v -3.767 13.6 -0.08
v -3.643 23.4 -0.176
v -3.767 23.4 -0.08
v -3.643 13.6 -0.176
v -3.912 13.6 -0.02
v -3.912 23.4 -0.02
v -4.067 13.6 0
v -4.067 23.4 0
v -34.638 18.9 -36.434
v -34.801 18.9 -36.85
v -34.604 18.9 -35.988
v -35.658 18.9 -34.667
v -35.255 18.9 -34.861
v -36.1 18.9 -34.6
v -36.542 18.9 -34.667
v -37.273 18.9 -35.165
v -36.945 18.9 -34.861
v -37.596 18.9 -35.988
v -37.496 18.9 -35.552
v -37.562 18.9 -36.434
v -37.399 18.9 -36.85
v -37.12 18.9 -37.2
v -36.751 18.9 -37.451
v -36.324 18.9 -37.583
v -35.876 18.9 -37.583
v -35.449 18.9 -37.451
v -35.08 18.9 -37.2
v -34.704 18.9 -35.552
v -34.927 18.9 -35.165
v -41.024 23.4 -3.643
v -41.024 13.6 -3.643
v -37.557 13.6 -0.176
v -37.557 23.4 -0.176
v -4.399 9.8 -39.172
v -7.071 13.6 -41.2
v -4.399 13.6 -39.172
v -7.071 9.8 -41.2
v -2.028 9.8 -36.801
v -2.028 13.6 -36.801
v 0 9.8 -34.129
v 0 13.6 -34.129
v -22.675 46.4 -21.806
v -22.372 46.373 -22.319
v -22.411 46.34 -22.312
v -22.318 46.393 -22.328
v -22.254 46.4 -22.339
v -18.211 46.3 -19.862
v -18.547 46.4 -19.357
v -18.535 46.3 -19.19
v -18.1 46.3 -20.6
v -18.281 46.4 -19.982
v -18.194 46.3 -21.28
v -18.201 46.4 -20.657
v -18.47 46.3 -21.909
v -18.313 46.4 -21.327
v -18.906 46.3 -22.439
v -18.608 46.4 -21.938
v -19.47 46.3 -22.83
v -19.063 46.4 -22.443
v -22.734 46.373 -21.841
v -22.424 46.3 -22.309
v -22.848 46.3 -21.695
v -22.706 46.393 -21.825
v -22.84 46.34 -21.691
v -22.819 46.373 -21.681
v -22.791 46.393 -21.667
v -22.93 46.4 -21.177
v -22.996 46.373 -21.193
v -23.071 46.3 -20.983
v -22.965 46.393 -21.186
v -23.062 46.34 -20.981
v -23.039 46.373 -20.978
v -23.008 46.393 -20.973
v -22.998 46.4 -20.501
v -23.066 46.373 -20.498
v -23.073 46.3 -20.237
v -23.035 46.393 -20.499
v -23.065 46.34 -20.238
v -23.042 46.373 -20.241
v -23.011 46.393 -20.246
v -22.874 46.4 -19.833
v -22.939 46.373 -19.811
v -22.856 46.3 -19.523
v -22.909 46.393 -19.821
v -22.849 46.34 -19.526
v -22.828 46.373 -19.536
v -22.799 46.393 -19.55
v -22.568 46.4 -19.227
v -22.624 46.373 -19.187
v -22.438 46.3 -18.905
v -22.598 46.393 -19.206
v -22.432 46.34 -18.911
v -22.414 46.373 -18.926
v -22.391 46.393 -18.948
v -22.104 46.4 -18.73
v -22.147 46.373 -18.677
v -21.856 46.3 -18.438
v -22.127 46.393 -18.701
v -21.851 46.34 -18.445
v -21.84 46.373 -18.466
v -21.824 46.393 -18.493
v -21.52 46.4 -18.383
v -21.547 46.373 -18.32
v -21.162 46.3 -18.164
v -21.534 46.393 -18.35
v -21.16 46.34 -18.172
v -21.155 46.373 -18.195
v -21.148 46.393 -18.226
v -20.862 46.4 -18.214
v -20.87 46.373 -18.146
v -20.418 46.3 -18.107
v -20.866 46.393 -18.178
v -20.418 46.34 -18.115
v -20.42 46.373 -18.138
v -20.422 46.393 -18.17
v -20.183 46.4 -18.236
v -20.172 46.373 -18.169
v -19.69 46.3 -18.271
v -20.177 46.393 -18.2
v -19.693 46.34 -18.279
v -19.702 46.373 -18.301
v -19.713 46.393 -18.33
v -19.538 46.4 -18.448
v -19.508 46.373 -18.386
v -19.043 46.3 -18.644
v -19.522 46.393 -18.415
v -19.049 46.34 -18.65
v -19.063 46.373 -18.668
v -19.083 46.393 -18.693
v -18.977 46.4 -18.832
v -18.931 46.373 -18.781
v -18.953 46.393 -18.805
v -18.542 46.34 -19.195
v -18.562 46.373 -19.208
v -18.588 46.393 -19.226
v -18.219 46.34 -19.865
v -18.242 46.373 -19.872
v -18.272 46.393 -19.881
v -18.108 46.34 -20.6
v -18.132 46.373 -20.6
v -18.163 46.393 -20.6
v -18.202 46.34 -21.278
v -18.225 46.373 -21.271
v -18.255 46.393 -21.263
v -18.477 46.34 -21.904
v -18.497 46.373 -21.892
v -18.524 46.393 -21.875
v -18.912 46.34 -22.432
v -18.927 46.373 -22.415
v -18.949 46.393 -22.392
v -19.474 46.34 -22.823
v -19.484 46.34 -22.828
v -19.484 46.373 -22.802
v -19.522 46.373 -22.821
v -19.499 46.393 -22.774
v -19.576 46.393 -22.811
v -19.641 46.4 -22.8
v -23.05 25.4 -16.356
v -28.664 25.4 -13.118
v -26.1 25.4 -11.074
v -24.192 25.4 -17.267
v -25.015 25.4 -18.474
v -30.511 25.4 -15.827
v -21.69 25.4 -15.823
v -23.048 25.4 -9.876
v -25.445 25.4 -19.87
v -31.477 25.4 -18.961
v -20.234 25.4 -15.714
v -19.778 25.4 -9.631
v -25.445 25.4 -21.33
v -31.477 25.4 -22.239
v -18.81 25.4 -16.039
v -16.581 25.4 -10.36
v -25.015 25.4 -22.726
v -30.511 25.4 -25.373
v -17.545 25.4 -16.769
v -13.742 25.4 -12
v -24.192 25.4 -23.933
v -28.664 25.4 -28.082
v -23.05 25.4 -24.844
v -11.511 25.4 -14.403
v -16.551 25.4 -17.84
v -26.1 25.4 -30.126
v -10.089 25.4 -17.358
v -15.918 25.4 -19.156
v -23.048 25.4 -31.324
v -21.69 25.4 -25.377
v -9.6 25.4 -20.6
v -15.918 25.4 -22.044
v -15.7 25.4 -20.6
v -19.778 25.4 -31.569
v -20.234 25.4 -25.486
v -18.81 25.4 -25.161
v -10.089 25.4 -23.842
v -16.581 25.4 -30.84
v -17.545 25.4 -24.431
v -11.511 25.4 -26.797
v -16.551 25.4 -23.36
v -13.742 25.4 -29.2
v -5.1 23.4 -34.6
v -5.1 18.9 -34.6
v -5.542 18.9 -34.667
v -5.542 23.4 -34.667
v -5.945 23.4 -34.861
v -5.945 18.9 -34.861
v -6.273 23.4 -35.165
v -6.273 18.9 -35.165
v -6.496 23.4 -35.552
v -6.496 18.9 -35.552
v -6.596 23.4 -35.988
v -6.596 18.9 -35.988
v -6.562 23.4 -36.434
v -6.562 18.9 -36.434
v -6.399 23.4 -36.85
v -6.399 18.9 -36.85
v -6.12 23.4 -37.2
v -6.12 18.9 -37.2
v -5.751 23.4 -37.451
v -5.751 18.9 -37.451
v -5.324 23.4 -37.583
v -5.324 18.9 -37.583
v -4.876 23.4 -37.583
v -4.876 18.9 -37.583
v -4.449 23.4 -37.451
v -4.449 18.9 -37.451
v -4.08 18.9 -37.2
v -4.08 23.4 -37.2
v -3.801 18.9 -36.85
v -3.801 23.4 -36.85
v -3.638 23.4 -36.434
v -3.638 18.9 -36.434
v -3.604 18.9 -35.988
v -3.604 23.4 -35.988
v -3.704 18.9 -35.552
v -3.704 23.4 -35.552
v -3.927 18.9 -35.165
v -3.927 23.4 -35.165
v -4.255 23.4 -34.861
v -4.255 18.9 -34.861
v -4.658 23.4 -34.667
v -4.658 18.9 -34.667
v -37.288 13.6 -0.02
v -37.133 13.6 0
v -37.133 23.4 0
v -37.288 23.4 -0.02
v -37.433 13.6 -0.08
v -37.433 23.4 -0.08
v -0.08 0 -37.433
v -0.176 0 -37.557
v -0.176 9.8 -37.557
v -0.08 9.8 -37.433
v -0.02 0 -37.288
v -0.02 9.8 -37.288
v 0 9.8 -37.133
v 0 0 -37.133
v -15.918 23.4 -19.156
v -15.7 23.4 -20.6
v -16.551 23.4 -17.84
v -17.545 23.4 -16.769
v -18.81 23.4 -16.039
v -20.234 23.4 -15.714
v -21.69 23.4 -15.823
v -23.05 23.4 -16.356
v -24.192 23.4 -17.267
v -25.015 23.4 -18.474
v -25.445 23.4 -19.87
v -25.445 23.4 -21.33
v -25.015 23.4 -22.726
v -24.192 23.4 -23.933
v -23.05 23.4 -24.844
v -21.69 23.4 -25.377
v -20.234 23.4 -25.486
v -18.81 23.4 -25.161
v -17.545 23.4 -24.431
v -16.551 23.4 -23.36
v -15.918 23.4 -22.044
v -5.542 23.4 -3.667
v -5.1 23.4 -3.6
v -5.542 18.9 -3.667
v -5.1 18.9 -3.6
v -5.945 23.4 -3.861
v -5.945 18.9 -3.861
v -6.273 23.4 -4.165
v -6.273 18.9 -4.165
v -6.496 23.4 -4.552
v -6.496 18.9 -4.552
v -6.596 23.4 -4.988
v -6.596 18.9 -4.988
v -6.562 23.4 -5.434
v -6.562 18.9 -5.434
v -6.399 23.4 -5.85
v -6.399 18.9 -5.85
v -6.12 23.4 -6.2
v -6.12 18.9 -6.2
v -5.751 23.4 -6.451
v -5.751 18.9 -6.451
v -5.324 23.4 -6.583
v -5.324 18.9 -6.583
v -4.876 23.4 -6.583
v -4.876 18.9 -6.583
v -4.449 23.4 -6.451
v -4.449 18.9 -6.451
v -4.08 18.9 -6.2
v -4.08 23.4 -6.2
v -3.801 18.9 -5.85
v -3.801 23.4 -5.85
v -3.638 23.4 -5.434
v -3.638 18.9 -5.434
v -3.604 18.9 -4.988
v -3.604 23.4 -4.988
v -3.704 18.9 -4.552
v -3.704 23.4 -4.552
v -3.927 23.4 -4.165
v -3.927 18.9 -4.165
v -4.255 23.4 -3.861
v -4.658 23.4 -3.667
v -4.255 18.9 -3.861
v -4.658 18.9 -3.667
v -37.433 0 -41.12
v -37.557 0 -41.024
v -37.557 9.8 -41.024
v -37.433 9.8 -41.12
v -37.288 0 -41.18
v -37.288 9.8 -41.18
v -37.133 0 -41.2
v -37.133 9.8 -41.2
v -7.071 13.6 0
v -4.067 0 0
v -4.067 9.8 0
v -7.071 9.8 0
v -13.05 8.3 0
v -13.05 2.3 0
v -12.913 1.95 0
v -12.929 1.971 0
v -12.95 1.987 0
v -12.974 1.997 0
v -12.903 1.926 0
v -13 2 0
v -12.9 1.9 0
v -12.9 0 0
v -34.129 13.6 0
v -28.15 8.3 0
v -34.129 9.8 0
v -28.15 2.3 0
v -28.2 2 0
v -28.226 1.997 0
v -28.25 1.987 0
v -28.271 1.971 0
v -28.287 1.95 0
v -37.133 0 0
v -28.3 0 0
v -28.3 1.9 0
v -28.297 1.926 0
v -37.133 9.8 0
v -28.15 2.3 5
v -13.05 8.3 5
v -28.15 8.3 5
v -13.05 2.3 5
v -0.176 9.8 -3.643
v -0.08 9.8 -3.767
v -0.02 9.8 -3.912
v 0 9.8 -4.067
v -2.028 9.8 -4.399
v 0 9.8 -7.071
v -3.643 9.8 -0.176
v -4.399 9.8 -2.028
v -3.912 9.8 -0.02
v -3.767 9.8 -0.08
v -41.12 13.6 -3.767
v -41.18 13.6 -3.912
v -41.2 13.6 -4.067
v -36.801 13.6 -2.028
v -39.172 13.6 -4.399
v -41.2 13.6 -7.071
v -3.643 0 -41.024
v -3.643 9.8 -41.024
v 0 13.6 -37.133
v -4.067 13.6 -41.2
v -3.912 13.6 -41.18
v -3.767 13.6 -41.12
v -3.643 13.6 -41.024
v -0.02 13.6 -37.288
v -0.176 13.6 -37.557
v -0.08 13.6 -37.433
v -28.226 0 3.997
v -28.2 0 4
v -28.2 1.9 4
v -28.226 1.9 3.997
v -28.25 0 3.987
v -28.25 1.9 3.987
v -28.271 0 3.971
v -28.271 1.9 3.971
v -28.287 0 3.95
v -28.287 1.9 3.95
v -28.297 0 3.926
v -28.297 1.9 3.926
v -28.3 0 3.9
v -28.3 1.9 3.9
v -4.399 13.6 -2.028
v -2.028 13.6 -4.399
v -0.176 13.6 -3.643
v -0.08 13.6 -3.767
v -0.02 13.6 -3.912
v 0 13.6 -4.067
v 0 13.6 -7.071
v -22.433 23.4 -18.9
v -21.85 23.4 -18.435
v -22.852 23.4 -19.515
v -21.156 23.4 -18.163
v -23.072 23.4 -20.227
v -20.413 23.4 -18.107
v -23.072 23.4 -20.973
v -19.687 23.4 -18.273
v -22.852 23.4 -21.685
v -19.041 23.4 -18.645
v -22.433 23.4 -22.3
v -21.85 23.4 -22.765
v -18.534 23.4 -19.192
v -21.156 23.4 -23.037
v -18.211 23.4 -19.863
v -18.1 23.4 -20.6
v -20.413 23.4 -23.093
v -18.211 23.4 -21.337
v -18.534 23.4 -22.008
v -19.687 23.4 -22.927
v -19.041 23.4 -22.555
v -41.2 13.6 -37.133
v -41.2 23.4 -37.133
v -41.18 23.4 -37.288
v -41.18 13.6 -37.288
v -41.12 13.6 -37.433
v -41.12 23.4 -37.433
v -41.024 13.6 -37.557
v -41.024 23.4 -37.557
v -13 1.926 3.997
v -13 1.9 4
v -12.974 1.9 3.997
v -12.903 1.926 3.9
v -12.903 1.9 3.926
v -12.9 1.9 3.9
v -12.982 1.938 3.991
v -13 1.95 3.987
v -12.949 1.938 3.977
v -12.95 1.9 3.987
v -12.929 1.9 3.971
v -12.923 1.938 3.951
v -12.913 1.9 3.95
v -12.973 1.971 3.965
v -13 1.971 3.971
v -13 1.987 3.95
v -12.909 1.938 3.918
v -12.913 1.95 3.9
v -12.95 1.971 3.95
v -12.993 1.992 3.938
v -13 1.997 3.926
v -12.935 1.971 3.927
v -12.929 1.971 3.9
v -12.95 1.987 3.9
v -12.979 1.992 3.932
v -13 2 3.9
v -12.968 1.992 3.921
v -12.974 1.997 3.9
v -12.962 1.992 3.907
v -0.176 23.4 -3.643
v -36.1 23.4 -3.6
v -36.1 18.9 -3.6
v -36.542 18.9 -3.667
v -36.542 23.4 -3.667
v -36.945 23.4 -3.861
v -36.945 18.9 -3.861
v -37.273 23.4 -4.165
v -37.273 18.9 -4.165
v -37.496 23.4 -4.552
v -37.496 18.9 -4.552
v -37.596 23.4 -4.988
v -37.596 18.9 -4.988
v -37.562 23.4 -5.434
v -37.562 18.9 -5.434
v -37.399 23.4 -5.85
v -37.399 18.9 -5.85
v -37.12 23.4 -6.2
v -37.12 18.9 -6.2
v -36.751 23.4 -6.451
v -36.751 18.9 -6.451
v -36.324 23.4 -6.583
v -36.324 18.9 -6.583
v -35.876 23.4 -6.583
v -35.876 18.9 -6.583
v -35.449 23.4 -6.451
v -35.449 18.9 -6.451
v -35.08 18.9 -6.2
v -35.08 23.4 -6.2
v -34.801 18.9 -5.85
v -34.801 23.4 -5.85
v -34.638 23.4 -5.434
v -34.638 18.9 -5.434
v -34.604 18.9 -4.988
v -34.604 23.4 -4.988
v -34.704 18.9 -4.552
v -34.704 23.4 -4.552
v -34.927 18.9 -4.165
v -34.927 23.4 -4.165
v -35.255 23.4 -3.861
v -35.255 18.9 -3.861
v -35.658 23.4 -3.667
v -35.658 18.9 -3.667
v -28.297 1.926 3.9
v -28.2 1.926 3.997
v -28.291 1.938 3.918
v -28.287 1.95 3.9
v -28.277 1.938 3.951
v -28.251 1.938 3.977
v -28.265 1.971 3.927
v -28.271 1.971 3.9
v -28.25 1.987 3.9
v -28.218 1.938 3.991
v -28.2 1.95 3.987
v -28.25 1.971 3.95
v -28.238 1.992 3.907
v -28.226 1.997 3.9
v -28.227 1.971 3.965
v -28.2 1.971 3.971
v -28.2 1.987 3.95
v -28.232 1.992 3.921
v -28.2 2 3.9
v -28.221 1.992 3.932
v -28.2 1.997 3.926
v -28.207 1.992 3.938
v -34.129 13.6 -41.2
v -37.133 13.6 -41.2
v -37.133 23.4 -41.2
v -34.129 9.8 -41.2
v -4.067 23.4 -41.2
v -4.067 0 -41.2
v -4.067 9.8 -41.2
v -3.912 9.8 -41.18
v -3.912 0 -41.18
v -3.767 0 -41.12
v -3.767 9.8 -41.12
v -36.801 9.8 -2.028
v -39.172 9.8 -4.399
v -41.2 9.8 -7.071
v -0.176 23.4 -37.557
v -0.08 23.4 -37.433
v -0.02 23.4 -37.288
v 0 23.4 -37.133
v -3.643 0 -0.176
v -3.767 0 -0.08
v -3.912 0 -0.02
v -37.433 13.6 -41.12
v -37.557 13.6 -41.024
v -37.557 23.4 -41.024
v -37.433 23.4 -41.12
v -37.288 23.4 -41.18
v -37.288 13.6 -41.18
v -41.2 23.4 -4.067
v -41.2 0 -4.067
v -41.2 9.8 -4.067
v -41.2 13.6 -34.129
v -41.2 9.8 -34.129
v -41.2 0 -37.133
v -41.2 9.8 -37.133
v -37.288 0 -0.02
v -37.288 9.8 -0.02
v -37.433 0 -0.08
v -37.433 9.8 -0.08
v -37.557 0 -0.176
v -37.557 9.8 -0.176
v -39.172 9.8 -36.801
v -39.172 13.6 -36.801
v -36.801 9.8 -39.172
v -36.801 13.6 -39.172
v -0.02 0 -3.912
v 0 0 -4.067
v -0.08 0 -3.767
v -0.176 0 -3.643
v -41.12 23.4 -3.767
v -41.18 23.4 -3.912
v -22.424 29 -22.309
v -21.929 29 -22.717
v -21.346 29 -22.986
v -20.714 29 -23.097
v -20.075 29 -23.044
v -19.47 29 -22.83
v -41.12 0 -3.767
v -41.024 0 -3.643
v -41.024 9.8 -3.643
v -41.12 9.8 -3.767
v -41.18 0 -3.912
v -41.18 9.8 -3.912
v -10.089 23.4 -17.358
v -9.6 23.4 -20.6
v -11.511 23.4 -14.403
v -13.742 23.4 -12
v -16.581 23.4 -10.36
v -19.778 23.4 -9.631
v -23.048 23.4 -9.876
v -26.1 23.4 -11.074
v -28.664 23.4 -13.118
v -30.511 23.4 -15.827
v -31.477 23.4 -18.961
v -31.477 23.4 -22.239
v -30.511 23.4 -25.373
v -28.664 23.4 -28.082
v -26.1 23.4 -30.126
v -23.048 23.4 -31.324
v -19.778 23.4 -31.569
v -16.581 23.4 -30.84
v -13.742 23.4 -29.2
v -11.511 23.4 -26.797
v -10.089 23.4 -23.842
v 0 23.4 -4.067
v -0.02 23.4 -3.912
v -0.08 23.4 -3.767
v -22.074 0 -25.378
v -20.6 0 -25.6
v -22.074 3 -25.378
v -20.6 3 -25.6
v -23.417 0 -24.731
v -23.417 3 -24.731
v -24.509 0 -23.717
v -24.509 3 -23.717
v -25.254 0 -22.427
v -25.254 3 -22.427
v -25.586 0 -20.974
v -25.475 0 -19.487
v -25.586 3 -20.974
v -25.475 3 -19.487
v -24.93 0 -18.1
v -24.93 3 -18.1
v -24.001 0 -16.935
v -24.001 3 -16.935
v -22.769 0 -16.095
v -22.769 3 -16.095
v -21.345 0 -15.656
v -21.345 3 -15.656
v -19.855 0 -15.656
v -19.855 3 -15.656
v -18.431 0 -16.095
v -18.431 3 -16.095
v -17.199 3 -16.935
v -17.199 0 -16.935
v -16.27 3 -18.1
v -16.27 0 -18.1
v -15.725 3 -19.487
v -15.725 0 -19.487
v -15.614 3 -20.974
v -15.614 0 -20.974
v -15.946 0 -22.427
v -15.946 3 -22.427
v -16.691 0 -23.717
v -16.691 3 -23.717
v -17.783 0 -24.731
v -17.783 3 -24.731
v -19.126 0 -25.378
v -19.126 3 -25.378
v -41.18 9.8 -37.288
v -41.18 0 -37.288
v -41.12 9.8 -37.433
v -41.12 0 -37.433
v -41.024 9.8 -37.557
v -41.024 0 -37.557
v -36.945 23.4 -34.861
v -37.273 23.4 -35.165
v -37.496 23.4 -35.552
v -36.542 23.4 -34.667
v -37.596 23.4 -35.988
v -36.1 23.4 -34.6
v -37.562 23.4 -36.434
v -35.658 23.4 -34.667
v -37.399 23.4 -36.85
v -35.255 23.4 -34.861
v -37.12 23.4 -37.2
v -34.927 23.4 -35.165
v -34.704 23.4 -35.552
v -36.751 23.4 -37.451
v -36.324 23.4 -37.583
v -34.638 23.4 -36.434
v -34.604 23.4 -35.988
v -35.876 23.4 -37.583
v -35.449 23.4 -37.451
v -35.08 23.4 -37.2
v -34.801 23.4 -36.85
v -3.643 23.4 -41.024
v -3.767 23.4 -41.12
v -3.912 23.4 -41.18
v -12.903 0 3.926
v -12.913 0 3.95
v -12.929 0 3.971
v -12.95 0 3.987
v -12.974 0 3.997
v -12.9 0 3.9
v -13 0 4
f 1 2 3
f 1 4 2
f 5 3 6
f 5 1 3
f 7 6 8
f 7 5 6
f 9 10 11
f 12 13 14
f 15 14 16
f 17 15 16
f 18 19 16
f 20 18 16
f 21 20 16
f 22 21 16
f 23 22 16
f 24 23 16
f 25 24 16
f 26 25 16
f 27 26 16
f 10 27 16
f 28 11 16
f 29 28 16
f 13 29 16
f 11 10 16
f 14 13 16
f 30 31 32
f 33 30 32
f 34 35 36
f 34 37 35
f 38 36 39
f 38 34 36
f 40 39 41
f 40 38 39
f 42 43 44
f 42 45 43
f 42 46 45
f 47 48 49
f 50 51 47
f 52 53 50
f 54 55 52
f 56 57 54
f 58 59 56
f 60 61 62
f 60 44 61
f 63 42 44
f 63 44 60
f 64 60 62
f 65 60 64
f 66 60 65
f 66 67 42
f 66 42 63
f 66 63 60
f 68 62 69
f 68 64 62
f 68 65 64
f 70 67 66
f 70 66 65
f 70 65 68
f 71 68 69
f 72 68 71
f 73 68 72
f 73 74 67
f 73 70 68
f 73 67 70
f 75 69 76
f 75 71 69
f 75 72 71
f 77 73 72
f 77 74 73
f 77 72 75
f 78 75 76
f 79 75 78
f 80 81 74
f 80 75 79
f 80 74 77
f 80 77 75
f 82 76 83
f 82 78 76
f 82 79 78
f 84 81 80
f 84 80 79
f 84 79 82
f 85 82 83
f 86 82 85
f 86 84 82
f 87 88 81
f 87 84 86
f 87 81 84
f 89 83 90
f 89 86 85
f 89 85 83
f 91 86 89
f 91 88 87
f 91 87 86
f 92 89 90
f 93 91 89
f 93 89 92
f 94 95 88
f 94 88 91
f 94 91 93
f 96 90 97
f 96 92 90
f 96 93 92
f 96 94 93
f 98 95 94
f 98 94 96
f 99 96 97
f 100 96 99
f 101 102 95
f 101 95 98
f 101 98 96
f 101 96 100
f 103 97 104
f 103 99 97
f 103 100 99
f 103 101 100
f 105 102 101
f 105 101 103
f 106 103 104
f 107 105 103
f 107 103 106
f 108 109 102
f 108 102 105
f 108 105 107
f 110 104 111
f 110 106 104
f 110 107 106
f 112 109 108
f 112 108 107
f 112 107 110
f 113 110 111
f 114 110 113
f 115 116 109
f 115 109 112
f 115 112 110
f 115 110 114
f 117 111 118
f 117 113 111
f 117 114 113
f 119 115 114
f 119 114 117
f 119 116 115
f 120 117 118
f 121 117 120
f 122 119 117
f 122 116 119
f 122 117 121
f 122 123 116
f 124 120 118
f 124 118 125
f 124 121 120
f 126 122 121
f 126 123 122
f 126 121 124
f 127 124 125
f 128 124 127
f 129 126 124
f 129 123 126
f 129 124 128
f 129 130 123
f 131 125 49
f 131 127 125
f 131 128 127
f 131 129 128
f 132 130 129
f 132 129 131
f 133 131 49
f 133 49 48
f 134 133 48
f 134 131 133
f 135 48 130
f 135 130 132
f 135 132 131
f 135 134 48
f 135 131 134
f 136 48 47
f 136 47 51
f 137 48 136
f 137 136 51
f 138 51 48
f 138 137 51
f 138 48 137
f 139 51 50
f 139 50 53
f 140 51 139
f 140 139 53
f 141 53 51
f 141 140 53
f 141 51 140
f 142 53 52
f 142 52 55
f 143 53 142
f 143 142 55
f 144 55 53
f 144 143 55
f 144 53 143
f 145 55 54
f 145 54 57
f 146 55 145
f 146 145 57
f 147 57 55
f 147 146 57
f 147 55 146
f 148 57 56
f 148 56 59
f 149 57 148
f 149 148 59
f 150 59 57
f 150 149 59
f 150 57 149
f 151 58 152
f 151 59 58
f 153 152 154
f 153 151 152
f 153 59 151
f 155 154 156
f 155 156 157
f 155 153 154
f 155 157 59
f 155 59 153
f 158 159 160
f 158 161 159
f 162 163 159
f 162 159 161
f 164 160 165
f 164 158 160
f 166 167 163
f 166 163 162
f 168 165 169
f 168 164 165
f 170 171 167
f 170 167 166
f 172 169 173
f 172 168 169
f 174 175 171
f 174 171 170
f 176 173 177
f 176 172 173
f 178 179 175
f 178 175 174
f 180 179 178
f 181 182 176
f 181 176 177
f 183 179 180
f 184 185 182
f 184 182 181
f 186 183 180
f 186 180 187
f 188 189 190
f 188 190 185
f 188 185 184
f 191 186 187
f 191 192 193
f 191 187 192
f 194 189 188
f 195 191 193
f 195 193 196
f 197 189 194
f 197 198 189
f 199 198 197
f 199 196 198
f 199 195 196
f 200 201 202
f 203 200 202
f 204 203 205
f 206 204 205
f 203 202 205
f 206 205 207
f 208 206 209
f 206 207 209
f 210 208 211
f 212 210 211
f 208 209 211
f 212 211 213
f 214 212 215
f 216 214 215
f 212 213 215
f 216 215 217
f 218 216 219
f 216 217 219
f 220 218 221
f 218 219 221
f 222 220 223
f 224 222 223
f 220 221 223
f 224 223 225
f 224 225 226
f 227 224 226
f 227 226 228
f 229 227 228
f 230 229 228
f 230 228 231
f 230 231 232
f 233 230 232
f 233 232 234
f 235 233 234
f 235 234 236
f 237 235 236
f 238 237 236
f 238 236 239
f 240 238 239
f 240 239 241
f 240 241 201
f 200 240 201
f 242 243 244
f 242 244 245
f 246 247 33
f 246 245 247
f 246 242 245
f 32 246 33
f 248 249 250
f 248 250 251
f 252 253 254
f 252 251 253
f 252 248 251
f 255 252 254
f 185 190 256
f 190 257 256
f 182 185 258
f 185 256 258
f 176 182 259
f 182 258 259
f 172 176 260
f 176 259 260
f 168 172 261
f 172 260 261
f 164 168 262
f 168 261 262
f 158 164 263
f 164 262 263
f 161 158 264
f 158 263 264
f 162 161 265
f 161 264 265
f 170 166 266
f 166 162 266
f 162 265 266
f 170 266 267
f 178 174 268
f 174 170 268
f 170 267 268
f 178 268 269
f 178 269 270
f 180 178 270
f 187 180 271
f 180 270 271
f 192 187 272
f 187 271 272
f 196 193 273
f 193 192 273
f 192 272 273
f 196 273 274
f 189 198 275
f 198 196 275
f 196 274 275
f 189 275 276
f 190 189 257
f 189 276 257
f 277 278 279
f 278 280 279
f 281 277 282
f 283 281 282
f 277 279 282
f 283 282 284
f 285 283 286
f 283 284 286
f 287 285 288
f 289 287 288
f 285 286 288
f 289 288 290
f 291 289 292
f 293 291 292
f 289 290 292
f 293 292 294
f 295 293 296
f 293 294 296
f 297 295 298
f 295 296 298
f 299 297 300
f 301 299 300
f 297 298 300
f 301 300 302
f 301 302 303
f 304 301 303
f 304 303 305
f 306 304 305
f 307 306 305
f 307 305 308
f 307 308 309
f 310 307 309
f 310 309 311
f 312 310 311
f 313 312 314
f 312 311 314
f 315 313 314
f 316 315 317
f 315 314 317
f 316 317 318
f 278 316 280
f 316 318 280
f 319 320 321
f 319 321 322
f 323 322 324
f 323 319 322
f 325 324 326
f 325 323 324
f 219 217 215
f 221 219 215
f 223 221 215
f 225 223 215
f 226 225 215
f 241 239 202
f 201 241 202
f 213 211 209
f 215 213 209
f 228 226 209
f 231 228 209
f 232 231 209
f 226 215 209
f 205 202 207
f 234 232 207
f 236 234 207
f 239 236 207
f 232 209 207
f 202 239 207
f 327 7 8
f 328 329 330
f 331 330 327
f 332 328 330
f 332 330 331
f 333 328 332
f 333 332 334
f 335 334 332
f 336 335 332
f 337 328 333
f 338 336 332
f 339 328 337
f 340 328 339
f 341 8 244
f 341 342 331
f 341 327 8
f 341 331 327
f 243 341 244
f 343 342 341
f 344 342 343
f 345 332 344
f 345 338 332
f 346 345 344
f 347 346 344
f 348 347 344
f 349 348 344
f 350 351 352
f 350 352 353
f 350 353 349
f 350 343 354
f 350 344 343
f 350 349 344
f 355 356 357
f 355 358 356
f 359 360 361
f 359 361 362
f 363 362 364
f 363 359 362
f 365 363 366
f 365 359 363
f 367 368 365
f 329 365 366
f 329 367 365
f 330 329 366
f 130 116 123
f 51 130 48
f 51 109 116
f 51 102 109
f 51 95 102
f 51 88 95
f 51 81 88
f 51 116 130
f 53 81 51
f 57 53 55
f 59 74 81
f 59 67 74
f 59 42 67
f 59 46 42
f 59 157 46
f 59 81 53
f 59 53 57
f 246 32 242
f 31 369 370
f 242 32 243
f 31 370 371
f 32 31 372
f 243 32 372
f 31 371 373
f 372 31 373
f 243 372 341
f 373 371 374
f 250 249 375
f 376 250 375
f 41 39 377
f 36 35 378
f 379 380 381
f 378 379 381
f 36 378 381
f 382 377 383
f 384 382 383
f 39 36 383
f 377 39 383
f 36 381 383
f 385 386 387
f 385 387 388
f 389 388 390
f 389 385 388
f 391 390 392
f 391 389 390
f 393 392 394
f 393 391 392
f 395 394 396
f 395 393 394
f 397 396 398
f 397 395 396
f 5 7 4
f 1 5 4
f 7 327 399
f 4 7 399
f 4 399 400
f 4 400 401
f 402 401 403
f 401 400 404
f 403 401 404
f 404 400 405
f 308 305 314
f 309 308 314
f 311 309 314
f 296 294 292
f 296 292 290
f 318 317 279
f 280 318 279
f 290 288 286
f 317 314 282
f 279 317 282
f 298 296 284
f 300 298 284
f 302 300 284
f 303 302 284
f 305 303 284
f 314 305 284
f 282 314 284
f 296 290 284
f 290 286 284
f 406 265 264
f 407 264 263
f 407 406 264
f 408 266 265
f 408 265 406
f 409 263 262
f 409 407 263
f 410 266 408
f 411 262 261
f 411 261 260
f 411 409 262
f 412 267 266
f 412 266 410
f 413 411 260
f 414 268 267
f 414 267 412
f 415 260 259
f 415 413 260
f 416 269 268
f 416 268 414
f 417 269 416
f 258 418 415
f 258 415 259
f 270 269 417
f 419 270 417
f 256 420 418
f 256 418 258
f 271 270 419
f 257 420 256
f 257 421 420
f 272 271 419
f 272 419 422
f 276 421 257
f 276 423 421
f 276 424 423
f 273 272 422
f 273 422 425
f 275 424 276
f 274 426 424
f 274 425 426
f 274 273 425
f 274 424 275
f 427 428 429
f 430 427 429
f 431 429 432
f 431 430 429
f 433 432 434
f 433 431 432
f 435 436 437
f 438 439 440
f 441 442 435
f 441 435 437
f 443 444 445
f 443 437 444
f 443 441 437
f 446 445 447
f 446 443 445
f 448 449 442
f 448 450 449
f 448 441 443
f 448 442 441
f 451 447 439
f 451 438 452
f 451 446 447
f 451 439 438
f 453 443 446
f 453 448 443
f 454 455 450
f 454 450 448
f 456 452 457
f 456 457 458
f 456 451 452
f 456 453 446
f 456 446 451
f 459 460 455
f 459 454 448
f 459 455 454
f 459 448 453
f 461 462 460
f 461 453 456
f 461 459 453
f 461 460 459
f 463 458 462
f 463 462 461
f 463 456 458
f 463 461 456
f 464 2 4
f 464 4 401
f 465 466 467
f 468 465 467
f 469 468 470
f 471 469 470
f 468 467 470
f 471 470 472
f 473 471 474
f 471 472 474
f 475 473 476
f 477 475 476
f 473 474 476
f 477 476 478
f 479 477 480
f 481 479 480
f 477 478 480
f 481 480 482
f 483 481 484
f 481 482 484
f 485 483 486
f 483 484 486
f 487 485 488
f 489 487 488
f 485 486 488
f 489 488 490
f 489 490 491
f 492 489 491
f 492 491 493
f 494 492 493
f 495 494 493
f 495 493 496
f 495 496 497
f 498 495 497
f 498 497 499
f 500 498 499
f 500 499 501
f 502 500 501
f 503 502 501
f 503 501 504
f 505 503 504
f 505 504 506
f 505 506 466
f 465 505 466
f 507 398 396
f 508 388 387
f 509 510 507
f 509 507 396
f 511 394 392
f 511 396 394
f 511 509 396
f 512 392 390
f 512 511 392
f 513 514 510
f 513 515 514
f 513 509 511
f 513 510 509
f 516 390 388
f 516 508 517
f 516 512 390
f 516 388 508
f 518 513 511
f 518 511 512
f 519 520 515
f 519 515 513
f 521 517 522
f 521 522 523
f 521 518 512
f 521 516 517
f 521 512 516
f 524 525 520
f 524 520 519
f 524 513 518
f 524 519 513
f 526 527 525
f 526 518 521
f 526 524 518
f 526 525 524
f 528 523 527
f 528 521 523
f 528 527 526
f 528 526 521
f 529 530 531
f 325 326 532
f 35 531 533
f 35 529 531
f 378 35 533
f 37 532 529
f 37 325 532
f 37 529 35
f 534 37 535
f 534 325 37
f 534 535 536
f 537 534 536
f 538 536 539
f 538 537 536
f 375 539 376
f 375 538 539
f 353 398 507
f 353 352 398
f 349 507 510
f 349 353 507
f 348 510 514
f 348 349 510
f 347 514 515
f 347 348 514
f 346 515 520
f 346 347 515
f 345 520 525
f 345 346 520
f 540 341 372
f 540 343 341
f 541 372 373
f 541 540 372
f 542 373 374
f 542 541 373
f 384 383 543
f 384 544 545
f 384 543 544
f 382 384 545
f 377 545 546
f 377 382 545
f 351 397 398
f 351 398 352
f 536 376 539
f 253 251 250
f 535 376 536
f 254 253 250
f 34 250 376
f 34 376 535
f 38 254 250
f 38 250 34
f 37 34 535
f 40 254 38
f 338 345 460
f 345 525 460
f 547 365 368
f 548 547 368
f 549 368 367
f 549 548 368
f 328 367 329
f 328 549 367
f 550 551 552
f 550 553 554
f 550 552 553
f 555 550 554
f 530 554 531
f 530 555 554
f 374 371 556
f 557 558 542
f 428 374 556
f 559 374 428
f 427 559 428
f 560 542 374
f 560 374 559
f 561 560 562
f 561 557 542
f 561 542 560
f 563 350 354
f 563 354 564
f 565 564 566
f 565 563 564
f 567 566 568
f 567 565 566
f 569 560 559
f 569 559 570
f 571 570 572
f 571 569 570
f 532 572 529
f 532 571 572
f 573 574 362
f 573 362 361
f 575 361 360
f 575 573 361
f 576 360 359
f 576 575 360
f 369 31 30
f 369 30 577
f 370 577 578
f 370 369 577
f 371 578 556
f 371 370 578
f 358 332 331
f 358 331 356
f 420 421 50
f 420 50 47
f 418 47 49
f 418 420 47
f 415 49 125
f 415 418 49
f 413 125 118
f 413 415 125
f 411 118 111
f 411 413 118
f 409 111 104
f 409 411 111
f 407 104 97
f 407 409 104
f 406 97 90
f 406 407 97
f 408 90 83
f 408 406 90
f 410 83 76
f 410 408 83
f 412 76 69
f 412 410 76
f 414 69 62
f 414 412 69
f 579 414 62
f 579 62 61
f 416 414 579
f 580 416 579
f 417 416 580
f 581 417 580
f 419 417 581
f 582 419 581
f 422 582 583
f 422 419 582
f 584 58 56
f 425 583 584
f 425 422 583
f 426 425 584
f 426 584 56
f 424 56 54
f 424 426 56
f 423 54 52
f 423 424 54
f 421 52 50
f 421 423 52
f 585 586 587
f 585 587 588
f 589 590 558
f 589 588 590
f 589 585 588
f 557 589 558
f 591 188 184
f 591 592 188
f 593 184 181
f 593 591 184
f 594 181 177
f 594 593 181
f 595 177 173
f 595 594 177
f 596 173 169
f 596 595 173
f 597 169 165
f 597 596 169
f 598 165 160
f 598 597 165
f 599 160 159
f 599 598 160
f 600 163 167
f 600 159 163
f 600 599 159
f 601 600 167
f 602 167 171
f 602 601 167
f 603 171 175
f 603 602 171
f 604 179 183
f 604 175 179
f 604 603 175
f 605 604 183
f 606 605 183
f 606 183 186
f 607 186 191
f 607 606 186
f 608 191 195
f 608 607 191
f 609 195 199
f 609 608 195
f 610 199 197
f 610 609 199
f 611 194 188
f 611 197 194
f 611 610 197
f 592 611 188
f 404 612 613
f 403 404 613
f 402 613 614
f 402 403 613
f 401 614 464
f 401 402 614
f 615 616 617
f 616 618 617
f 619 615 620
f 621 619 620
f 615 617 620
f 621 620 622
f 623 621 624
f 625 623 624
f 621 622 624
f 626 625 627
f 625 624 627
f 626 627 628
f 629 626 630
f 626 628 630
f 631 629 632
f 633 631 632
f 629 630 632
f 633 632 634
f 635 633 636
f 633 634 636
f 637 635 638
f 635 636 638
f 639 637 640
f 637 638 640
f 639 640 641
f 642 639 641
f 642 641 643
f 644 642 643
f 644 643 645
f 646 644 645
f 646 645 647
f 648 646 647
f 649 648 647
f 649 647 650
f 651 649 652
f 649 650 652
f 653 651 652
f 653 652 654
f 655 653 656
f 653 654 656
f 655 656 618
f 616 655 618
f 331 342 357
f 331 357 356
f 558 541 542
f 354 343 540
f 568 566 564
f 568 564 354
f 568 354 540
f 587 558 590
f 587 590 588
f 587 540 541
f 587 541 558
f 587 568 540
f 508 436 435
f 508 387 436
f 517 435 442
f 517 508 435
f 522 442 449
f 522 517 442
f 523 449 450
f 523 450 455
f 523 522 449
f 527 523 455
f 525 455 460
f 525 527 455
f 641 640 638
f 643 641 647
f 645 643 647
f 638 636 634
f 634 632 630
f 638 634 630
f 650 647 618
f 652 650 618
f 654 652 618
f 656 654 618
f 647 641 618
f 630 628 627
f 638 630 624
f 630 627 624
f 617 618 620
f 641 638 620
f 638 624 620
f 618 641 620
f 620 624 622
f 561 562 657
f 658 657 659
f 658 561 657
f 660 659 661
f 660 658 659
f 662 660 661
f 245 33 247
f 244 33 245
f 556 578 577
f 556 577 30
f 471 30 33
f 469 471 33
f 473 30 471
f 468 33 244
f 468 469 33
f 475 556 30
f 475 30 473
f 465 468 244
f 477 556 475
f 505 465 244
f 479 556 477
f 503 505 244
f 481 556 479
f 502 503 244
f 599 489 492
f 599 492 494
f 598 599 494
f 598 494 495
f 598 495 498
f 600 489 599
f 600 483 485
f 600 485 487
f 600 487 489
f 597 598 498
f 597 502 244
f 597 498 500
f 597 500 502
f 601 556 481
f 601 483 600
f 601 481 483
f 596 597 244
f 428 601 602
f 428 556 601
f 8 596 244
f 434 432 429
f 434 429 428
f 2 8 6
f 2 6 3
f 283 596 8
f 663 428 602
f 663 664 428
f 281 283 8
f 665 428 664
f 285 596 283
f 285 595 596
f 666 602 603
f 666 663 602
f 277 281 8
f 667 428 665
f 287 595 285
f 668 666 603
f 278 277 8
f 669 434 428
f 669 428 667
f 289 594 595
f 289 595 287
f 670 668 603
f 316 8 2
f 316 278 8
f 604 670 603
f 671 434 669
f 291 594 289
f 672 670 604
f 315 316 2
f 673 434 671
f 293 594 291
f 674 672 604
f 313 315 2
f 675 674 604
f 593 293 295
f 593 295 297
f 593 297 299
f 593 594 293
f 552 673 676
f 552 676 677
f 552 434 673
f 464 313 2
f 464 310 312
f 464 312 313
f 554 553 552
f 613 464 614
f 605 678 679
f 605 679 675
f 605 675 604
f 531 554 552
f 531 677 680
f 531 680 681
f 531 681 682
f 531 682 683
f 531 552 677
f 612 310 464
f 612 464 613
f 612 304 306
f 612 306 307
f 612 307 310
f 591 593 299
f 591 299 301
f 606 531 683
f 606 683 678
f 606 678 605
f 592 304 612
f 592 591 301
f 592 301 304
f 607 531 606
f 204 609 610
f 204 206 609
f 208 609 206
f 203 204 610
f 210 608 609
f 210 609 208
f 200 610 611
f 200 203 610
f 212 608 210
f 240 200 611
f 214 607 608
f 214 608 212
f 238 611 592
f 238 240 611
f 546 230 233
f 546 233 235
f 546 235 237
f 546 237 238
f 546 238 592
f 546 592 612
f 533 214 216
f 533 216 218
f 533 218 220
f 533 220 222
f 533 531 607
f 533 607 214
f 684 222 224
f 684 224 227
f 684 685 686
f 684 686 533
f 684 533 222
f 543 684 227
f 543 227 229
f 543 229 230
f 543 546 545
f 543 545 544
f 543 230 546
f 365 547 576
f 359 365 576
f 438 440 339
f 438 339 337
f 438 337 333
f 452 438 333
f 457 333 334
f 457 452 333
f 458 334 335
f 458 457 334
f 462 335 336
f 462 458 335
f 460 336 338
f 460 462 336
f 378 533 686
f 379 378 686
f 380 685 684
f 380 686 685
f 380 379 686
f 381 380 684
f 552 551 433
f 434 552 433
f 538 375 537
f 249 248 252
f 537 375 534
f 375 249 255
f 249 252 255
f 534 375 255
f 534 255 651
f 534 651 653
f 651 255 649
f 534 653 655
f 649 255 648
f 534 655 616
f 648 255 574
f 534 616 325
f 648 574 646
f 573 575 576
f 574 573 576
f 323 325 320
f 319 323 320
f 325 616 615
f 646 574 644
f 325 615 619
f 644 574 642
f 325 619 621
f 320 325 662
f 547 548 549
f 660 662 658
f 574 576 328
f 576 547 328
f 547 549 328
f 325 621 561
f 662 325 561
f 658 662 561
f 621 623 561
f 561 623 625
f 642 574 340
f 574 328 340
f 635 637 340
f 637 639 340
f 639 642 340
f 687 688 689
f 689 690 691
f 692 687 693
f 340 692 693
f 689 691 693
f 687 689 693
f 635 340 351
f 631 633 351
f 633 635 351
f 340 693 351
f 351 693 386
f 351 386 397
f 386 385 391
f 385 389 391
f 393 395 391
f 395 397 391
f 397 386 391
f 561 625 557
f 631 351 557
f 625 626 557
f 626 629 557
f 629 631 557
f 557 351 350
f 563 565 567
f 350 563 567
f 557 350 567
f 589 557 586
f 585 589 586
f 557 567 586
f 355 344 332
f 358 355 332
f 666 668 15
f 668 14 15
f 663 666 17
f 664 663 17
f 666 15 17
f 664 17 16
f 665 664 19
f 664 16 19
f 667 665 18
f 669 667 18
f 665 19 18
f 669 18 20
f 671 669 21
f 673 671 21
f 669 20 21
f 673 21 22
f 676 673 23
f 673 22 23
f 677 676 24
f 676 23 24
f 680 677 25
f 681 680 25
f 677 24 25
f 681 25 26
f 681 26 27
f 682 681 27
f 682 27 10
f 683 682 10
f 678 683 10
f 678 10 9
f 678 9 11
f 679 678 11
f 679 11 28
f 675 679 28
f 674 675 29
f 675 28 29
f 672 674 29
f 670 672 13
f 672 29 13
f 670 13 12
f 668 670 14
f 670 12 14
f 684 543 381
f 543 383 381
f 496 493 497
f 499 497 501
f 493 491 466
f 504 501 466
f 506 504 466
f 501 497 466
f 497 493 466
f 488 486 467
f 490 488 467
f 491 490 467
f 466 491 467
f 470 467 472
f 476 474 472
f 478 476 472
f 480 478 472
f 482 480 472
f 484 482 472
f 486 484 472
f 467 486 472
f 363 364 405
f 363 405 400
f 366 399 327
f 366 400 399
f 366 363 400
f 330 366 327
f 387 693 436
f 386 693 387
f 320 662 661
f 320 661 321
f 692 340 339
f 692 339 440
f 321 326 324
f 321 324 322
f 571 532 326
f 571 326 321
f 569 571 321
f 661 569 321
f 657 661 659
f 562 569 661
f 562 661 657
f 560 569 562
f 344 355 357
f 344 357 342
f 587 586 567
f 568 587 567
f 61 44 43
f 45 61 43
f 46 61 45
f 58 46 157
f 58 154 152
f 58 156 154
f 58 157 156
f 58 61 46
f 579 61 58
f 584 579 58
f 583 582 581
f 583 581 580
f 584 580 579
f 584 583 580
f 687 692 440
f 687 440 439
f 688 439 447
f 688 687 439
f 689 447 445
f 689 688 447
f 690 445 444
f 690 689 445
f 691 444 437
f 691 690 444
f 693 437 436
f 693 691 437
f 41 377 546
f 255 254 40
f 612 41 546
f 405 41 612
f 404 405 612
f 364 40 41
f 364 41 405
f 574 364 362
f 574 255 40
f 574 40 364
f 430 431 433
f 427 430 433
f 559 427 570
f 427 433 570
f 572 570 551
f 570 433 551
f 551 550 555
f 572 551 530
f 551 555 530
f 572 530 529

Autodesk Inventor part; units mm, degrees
ref_plane "YZ Plane" through (0, 0, 0) normal (1, 0, 0) x (0, 1, 0)
ref_plane "XZ Plane" through (0, 0, 0) normal (0, 1, 0) x (-1, 0, 0)
ref_plane "XY Plane" through (0, 0, 0) normal (0, 0, 1) x (1, 0, 0)
sketch "スケッチ1" plane through (0, 0, 0) normal (0, 1, 0) x (-1, 0, 0)
  line L0 (41.0243, -3.6426) -> (37.5574, -0.1757)
  line L1 (41.0243, -37.5574) -> (37.5574, -41.0243)
  line L2 (3.6426, -0.1757) -> (0.1757, -3.6426)
  line L3 (0.1757, -37.5574) -> (3.6426, -41.0243)
  line L4 (0, -37.1331) -> (0, -4.0669)
  line L5 (37.1331, -41.2) -> (4.0669, -41.2)
  line L6 (41.2, -4.0669) -> (41.2, -37.1331)
  line L7 (37.1331, 0) -> (4.0669, 0)
  arc A0 (41.2, -4.0669) -> (41.0243, -3.6426) centre (40.6, -4.0669) ccw
  arc A1 (37.5574, -0.1757) -> (37.1331, 0) centre (37.1331, -0.6) ccw
  arc A2 (4.0669, 0) -> (3.6426, -0.1757) centre (4.0669, -0.6) ccw
  arc A3 (0.1757, -3.6426) -> (0, -4.0669) centre (0.6, -4.0669) ccw
  arc A4 (0, -37.1331) -> (0.1757, -37.5574) centre (0.6, -37.1331) ccw
  arc A5 (3.6426, -41.0243) -> (4.0669, -41.2) centre (4.0669, -40.6) ccw
  arc A6 (37.1331, -41.2) -> (37.5574, -41.0243) centre (37.1331, -40.6) ccw
  arc A7 (41.0243, -37.5574) -> (41.2, -37.1331) centre (40.6, -37.1331) ccw
  line L8 (25.8, 0) -> (15.4, 0)
  point P0 (0, 0)
  point P1 (41.2, -3.8184)
  point P2 (37.3816, 0)
  point P3 (39.2908, -1.9092)
  point P4 (37.3816, -41.2)
  point P5 (41.2, -37.3816)
  dimension "d2" = 5.4
  dimension "d3" = 5.4
  dimension "d4" = 0.6
extrude "押し出し1" add sketch "スケッチ1" along normal blind 9.8
sketch "スケッチ2" plane through (0, 9.8, 0) normal (0, 1, 0) x (1, 0, 0)
  line L0 (-41.2, 37.1331) -> (-41.2, 4.0669) projected
  line L1 (-41.0243, 3.6426) -> (-37.5574, 0.1757) projected
  line L2 (-4.0669, 41.2) -> (-37.1331, 41.2) projected
  line L3 (0, 4.0669) -> (0, 37.1331) projected
  line L4 (-37.1331, 0) -> (-4.0669, 0) projected
  line L5 (0, 34.1568) -> (0, 7.099)
  line L6 (-7.099, 0) -> (-34.1289, 0)
  line L7 (-41.2, 7.0711) -> (-41.2, 34.1568)
  line L8 (-37.5574, 41.0243) -> (-41.0243, 37.5574) projected
  line L9 (-3.6426, 0.1757) -> (-0.1757, 3.6426) projected
  arc A0 (-41.2, 7.0711) -> (-34.1289, 0) centre (-20.6, 20.6) ccw
  arc A1 (-7.071, 0) -> (0, 7.071) centre (-20.6, 20.6) ccw
  arc A2 (0, 34.1289) -> (-7.0711, 41.2) centre (-20.6, 20.6) ccw
  arc A3 (-34.1289, 41.2) -> (-41.2, 34.1289) centre (-20.6, 20.6) ccw
  line L10 (-34.1289, 0) -> (-7.071, 0)
  line L11 (-41.2, 7.0711) -> (-41.2, 34.1289)
  line L12 (-34.1289, 41.2) -> (-7.0711, 41.2)
  line L13 (0, 34.1289) -> (0, 7.071)
  point P0 (0, 0)
  point P1 (0, 40.8633)
  point P2 (-37.6645, 3.5355)
  point P3 (0, 34.1289)
  point P4 (-41.2, 41.2)
  point P5 (-7.071, 0)
  point P6 (0, 7.071)
  dimension "d8" = 10
  dimension "d9" = 10
extrude "押し出し2" add sketch "スケッチ2" along normal blind 3.8
ref_plane "作業平面1" through (0, 13.6, 0) normal (0, 1, 0) x (1, 0, 0)
sketch "スケッチ4" plane through (0, 13.6, 0) normal (0, 1, 0) x (1, 0, 0)
  line L0 (-4.0669, 0) -> (-37.1331, 0)
  line L1 (-41.2, 4.0669) -> (-41.2, 37.1331)
  line L2 (-37.1331, 41.2) -> (-4.0669, 41.2)
  line L3 (0, 37.1331) -> (0, 4.0669)
  line L4 (-41.0243, 3.6426) -> (-37.5574, 0.1757) projected
  line L5 (-41.0243, 3.6426) -> (-37.5574, 0.1757)
  line L6 (-0.1757, 37.5574) -> (-3.6426, 41.0243) projected
  line L7 (-3.6426, 41.0243) -> (-0.1757, 37.5574)
  line L8 (-3.6426, 0.1757) -> (-0.1757, 3.6426) projected
  line L9 (-0.1757, 3.6426) -> (-3.6426, 0.1757)
  line L10 (-37.5574, 41.0243) -> (-41.0243, 37.5574) projected
  line L11 (-37.5574, 41.0243) -> (-41.0243, 37.5574)
  arc A0 (-37.1331, 41.2) -> (-37.5574, 41.0243) centre (-37.1331, 40.6) ccw
  arc A1 (-41.0243, 37.5574) -> (-41.2, 37.1331) centre (-40.6, 37.1331) ccw
  line L12 (-41.0243, 3.6426) -> (-37.5574, 0.1757)
  arc A2 (-41.2, 4.0669) -> (-41.0243, 3.6426) centre (-40.6, 4.0669) ccw
  arc A3 (-37.5574, 0.1757) -> (-37.1331, 0) centre (-37.1331, 0.6) ccw
  arc A4 (-3.6426, 41.0243) -> (-4.0669, 41.2) centre (-4.0669, 40.6) ccw
  arc A5 (0, 37.1331) -> (-0.1757, 37.5574) centre (-0.6, 37.1331) ccw
  line L13 (-0.1757, 3.6426) -> (-3.6426, 0.1757)
  arc A6 (-0.1757, 3.6426) -> (0, 4.0669) centre (-0.6, 4.0669) ccw
  arc A7 (-4.0669, 0) -> (-3.6426, 0.1757) centre (-4.0669, 0.6) ccw
  point P0 (0, 0)
  point P1 (-41.2, 41.2)
  point P2 (-41.2, 0)
  point P3 (0, 41.2)
  point P4 (-41.0243, 37.5574)
  point P5 (-0.1757, 3.6426)
  dimension "d16" = 41.2
  dimension "d17" = 41.2
  dimension "d18" = 0.6
  dimension "d19" = 0.6
  dimension "d20" = 0.6
  dimension "d21" = 0.6
  dimension "d22" = 0.6
extrude "押し出し3" add sketch "スケッチ4" along normal blind 9.8
ref_plane "作業平面2" through (0, 0, 0) normal (0, -1, 0) x (1, 0, 0)
sketch "スケッチ5" plane through (0, 0, 0) normal (0, -1, 0) x (1, 0, 0)
  line L0 (-37.1331, 0) -> (-4.0669, 0) projected
  line L1 (-37.1331, 0) -> (-4.0669, 0) projected
  line L2 (-28.3, 0) -> (-12.9, 0)
  line L3 (-12.9, 0) -> (-12.9, 3.9)
  line L4 (-13, 4) -> (-28.2, 4)
  line L5 (-28.3, 3.9) -> (-28.3, 0)
  arc A0 (-28.2, 4) -> (-28.3, 3.9) centre (-28.2, 3.9) ccw
  arc A1 (-12.9, 3.9) -> (-13, 4) centre (-13, 3.9) ccw
  point P0 (0, 0)
  point P1 (-15.4, 0)
  point P2 (-12.9, 4)
  point P3 (-28.3, 4)
  point P4 (-28.3, 0)
  point P5 (-12.9, 0)
  point P6 (-20.6, 0)
  point P7 (-20.6, 0)
  dimension "d35" = 0.1
  dimension "d77" = 15.4
extrude "押し出し4" add sketch "スケッチ5" against normal blind 2
fillet "フィレット1" radius 0.1 5 edges at (-12.9, 2, 1.95) (-20.6, 2, 4) (-28.2707, 2, 3.9707) (-28.3, 2, 1.95) (-12.9293, 2, 3.9707)
ref_plane "作業平面3" through (0, 23.4, 0) normal (0, 1, 0) x (1, 0, 0)
sketch "スケッチ6" plane through (0, 23.4, 0) normal (0, 1, 0) x (1, 0, 0)
  line L0 (-41.2, 37.1331) -> (-41.2, 4.0669) projected
  line L1 (-4.0669, 41.2) -> (-37.1331, 41.2) projected
  line L2 (0, 4.0669) -> (0, 37.1331) projected
  line L3 (-37.1331, 0) -> (-4.0669, 0) projected
  circle A0 centre (-36.1, 5.1) radius 1.5
  circle A1 centre (-36.1, 36.1) radius 1.5
  circle A2 centre (-5.1, 36.1) radius 1.5
  circle A3 centre (-5.1, 5.1) radius 1.5
  point P0 (0, 0)
  dimension "d39" = 5.1
  dimension "d40" = 5.1
  dimension "d41" = 5.1
  dimension "d42" = 5.1
  dimension "d43" = 5.1
  dimension "d44" = 5.1
  dimension "d45" = 5.1
  dimension "d46" = 5.1
  dimension "d47" = 3
  dimension "d48" = 3
  dimension "d49" = 3
  dimension "d50" = 3
hole "穴1" at (-36.1, 23.4, -5.1) at (-36.1, 23.4, -36.1) at (-5.1, 23.4, -36.1) at (-5.1, 23.4, -5.1) direction (0, -1, 0) diameter 3 depth 4.5
sketch "スケッチ7" plane through (0, 23.4, 0) normal (0, 1, 0) x (1, 0, 0)
  circle A0 centre (-20.6, 20.6) radius 11
  circle A1 centre (-20.6, 20.6) radius 4.9
  point P0 (0, 0)
  dimension "d58" = 22
  dimension "d59" = 9.8
extrude "押し出し5" add sketch "スケッチ7" along normal blind 2
sketch "スケッチ8" plane through (-20.6, 23.4, -20.6) normal (0, 1, 0) x (1, 0, 0)
  circle A0 centre (0, 0) radius 4.9 projected
  circle A1 centre (0, 0) radius 2.5
  point P0 (20.6, -20.6)
  dimension "d62" = 5
extrude "押し出し6" add sketch "スケッチ8" along normal blind 5.6 contours A1
ref_plane "作業平面4" through (-20.6, 29, -20.6) normal (0, 1, 0) x (1, 0, 0)
sketch "スケッチ9" plane through (-20.6, 29, -20.6) normal (0, 1, 0) x (1, 0, 0)
  line L0 (-1.8244, 1.7093) -> (1.1301, 2.23)
  circle A0 centre (0, 0) radius 2.5 projected
  arc A1 (-1.8244, 1.7093) -> (1.1301, 2.23) centre (0, 0) ccw
  point P0 (20.6, -20.6)
  dimension "d67" = 3
extrude "押し出し7" add sketch "スケッチ9" along normal blind 17.4 contours L0 A0 picked at (-1.0191, 0.489)
fillet "フィレット2" radius 0.1 1 edges at (-20.1661, 46.4, -18.1379)
ref_plane "作業平面5" through (0, 2.3, 0) normal (0, 1, 0) x (1, 0, 0)
sketch "スケッチ10" plane through (0, 2.3, 0) normal (0, 1, 0) x (1, 0, 0)
  line L0 (-37.1331, 0) -> (-4.0669, 0) projected
  line L1 (-28.15, 0) -> (-13.05, 0)
  line L2 (-13.05, 0) -> (-13.05, -5)
  line L3 (-13.05, -5) -> (-28.15, -5)
  line L4 (-28.15, -5) -> (-28.15, 0)
  point P0 (0, 0)
  point P1 (-13.05, 0)
  point P2 (-13.05, 0)
  dimension "d74" = 5
  dimension "d80" = 15.1
extrude "押し出し8" add sketch "スケッチ10" along normal blind 6
sketch "スケッチ11" plane through (0, 0, 0) normal (0, -1, 0) x (1, 0, 0)
  circle A0 centre (-20.6, -20.6) radius 5
  point P0 (0, 0)
  dimension "d81" = 10
hole "穴2" at (-20.6, 0, -20.6) direction (0, 1, 0) diameter 10 depth 3
properties part number "stepper_motor"
